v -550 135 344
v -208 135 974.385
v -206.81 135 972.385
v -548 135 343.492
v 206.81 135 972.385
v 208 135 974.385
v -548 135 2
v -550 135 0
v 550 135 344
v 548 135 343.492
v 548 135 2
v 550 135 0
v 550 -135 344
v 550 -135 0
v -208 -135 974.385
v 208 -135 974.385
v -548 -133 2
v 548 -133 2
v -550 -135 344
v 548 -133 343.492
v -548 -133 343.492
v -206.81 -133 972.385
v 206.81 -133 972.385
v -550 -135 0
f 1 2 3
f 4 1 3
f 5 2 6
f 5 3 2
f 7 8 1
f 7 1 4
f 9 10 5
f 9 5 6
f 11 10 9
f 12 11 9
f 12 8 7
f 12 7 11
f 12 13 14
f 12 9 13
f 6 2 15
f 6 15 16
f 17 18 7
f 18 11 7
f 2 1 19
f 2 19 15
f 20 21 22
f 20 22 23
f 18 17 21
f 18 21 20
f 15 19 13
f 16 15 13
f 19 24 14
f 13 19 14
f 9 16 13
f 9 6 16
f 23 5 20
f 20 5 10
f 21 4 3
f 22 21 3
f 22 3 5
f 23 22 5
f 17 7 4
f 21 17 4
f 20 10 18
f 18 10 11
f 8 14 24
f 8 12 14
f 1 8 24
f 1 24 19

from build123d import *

# Parameters (mm, degrees)
BOSS_EXTRUDE1_DEPTH = 135
SHELL1_T            = -2


with BuildPart() as part:
    # Sketch1 → Boss-Extrude1 (new, symmetric)
    with BuildSketch(Plane(origin=(0, 0, 0), x_dir=(1, 0, 0), z_dir=(0, 1, 0))):
        Polygon((550, 0), (-550, 0), (-550, -344), (-208, -974.384977503), (208, -974.384977503), (550, -344), align=None)
    extrude(amount=BOSS_EXTRUDE1_DEPTH, both=True)

    # Shell1
    shell1_openings = [part.faces().sort_by_distance(p)[0] for p in [
        (0, 135, 417.430162071),
    ]]
    offset(amount=SHELL1_T, openings=shell1_openings, kind=Kind.INTERSECTION)


solid = part.part
